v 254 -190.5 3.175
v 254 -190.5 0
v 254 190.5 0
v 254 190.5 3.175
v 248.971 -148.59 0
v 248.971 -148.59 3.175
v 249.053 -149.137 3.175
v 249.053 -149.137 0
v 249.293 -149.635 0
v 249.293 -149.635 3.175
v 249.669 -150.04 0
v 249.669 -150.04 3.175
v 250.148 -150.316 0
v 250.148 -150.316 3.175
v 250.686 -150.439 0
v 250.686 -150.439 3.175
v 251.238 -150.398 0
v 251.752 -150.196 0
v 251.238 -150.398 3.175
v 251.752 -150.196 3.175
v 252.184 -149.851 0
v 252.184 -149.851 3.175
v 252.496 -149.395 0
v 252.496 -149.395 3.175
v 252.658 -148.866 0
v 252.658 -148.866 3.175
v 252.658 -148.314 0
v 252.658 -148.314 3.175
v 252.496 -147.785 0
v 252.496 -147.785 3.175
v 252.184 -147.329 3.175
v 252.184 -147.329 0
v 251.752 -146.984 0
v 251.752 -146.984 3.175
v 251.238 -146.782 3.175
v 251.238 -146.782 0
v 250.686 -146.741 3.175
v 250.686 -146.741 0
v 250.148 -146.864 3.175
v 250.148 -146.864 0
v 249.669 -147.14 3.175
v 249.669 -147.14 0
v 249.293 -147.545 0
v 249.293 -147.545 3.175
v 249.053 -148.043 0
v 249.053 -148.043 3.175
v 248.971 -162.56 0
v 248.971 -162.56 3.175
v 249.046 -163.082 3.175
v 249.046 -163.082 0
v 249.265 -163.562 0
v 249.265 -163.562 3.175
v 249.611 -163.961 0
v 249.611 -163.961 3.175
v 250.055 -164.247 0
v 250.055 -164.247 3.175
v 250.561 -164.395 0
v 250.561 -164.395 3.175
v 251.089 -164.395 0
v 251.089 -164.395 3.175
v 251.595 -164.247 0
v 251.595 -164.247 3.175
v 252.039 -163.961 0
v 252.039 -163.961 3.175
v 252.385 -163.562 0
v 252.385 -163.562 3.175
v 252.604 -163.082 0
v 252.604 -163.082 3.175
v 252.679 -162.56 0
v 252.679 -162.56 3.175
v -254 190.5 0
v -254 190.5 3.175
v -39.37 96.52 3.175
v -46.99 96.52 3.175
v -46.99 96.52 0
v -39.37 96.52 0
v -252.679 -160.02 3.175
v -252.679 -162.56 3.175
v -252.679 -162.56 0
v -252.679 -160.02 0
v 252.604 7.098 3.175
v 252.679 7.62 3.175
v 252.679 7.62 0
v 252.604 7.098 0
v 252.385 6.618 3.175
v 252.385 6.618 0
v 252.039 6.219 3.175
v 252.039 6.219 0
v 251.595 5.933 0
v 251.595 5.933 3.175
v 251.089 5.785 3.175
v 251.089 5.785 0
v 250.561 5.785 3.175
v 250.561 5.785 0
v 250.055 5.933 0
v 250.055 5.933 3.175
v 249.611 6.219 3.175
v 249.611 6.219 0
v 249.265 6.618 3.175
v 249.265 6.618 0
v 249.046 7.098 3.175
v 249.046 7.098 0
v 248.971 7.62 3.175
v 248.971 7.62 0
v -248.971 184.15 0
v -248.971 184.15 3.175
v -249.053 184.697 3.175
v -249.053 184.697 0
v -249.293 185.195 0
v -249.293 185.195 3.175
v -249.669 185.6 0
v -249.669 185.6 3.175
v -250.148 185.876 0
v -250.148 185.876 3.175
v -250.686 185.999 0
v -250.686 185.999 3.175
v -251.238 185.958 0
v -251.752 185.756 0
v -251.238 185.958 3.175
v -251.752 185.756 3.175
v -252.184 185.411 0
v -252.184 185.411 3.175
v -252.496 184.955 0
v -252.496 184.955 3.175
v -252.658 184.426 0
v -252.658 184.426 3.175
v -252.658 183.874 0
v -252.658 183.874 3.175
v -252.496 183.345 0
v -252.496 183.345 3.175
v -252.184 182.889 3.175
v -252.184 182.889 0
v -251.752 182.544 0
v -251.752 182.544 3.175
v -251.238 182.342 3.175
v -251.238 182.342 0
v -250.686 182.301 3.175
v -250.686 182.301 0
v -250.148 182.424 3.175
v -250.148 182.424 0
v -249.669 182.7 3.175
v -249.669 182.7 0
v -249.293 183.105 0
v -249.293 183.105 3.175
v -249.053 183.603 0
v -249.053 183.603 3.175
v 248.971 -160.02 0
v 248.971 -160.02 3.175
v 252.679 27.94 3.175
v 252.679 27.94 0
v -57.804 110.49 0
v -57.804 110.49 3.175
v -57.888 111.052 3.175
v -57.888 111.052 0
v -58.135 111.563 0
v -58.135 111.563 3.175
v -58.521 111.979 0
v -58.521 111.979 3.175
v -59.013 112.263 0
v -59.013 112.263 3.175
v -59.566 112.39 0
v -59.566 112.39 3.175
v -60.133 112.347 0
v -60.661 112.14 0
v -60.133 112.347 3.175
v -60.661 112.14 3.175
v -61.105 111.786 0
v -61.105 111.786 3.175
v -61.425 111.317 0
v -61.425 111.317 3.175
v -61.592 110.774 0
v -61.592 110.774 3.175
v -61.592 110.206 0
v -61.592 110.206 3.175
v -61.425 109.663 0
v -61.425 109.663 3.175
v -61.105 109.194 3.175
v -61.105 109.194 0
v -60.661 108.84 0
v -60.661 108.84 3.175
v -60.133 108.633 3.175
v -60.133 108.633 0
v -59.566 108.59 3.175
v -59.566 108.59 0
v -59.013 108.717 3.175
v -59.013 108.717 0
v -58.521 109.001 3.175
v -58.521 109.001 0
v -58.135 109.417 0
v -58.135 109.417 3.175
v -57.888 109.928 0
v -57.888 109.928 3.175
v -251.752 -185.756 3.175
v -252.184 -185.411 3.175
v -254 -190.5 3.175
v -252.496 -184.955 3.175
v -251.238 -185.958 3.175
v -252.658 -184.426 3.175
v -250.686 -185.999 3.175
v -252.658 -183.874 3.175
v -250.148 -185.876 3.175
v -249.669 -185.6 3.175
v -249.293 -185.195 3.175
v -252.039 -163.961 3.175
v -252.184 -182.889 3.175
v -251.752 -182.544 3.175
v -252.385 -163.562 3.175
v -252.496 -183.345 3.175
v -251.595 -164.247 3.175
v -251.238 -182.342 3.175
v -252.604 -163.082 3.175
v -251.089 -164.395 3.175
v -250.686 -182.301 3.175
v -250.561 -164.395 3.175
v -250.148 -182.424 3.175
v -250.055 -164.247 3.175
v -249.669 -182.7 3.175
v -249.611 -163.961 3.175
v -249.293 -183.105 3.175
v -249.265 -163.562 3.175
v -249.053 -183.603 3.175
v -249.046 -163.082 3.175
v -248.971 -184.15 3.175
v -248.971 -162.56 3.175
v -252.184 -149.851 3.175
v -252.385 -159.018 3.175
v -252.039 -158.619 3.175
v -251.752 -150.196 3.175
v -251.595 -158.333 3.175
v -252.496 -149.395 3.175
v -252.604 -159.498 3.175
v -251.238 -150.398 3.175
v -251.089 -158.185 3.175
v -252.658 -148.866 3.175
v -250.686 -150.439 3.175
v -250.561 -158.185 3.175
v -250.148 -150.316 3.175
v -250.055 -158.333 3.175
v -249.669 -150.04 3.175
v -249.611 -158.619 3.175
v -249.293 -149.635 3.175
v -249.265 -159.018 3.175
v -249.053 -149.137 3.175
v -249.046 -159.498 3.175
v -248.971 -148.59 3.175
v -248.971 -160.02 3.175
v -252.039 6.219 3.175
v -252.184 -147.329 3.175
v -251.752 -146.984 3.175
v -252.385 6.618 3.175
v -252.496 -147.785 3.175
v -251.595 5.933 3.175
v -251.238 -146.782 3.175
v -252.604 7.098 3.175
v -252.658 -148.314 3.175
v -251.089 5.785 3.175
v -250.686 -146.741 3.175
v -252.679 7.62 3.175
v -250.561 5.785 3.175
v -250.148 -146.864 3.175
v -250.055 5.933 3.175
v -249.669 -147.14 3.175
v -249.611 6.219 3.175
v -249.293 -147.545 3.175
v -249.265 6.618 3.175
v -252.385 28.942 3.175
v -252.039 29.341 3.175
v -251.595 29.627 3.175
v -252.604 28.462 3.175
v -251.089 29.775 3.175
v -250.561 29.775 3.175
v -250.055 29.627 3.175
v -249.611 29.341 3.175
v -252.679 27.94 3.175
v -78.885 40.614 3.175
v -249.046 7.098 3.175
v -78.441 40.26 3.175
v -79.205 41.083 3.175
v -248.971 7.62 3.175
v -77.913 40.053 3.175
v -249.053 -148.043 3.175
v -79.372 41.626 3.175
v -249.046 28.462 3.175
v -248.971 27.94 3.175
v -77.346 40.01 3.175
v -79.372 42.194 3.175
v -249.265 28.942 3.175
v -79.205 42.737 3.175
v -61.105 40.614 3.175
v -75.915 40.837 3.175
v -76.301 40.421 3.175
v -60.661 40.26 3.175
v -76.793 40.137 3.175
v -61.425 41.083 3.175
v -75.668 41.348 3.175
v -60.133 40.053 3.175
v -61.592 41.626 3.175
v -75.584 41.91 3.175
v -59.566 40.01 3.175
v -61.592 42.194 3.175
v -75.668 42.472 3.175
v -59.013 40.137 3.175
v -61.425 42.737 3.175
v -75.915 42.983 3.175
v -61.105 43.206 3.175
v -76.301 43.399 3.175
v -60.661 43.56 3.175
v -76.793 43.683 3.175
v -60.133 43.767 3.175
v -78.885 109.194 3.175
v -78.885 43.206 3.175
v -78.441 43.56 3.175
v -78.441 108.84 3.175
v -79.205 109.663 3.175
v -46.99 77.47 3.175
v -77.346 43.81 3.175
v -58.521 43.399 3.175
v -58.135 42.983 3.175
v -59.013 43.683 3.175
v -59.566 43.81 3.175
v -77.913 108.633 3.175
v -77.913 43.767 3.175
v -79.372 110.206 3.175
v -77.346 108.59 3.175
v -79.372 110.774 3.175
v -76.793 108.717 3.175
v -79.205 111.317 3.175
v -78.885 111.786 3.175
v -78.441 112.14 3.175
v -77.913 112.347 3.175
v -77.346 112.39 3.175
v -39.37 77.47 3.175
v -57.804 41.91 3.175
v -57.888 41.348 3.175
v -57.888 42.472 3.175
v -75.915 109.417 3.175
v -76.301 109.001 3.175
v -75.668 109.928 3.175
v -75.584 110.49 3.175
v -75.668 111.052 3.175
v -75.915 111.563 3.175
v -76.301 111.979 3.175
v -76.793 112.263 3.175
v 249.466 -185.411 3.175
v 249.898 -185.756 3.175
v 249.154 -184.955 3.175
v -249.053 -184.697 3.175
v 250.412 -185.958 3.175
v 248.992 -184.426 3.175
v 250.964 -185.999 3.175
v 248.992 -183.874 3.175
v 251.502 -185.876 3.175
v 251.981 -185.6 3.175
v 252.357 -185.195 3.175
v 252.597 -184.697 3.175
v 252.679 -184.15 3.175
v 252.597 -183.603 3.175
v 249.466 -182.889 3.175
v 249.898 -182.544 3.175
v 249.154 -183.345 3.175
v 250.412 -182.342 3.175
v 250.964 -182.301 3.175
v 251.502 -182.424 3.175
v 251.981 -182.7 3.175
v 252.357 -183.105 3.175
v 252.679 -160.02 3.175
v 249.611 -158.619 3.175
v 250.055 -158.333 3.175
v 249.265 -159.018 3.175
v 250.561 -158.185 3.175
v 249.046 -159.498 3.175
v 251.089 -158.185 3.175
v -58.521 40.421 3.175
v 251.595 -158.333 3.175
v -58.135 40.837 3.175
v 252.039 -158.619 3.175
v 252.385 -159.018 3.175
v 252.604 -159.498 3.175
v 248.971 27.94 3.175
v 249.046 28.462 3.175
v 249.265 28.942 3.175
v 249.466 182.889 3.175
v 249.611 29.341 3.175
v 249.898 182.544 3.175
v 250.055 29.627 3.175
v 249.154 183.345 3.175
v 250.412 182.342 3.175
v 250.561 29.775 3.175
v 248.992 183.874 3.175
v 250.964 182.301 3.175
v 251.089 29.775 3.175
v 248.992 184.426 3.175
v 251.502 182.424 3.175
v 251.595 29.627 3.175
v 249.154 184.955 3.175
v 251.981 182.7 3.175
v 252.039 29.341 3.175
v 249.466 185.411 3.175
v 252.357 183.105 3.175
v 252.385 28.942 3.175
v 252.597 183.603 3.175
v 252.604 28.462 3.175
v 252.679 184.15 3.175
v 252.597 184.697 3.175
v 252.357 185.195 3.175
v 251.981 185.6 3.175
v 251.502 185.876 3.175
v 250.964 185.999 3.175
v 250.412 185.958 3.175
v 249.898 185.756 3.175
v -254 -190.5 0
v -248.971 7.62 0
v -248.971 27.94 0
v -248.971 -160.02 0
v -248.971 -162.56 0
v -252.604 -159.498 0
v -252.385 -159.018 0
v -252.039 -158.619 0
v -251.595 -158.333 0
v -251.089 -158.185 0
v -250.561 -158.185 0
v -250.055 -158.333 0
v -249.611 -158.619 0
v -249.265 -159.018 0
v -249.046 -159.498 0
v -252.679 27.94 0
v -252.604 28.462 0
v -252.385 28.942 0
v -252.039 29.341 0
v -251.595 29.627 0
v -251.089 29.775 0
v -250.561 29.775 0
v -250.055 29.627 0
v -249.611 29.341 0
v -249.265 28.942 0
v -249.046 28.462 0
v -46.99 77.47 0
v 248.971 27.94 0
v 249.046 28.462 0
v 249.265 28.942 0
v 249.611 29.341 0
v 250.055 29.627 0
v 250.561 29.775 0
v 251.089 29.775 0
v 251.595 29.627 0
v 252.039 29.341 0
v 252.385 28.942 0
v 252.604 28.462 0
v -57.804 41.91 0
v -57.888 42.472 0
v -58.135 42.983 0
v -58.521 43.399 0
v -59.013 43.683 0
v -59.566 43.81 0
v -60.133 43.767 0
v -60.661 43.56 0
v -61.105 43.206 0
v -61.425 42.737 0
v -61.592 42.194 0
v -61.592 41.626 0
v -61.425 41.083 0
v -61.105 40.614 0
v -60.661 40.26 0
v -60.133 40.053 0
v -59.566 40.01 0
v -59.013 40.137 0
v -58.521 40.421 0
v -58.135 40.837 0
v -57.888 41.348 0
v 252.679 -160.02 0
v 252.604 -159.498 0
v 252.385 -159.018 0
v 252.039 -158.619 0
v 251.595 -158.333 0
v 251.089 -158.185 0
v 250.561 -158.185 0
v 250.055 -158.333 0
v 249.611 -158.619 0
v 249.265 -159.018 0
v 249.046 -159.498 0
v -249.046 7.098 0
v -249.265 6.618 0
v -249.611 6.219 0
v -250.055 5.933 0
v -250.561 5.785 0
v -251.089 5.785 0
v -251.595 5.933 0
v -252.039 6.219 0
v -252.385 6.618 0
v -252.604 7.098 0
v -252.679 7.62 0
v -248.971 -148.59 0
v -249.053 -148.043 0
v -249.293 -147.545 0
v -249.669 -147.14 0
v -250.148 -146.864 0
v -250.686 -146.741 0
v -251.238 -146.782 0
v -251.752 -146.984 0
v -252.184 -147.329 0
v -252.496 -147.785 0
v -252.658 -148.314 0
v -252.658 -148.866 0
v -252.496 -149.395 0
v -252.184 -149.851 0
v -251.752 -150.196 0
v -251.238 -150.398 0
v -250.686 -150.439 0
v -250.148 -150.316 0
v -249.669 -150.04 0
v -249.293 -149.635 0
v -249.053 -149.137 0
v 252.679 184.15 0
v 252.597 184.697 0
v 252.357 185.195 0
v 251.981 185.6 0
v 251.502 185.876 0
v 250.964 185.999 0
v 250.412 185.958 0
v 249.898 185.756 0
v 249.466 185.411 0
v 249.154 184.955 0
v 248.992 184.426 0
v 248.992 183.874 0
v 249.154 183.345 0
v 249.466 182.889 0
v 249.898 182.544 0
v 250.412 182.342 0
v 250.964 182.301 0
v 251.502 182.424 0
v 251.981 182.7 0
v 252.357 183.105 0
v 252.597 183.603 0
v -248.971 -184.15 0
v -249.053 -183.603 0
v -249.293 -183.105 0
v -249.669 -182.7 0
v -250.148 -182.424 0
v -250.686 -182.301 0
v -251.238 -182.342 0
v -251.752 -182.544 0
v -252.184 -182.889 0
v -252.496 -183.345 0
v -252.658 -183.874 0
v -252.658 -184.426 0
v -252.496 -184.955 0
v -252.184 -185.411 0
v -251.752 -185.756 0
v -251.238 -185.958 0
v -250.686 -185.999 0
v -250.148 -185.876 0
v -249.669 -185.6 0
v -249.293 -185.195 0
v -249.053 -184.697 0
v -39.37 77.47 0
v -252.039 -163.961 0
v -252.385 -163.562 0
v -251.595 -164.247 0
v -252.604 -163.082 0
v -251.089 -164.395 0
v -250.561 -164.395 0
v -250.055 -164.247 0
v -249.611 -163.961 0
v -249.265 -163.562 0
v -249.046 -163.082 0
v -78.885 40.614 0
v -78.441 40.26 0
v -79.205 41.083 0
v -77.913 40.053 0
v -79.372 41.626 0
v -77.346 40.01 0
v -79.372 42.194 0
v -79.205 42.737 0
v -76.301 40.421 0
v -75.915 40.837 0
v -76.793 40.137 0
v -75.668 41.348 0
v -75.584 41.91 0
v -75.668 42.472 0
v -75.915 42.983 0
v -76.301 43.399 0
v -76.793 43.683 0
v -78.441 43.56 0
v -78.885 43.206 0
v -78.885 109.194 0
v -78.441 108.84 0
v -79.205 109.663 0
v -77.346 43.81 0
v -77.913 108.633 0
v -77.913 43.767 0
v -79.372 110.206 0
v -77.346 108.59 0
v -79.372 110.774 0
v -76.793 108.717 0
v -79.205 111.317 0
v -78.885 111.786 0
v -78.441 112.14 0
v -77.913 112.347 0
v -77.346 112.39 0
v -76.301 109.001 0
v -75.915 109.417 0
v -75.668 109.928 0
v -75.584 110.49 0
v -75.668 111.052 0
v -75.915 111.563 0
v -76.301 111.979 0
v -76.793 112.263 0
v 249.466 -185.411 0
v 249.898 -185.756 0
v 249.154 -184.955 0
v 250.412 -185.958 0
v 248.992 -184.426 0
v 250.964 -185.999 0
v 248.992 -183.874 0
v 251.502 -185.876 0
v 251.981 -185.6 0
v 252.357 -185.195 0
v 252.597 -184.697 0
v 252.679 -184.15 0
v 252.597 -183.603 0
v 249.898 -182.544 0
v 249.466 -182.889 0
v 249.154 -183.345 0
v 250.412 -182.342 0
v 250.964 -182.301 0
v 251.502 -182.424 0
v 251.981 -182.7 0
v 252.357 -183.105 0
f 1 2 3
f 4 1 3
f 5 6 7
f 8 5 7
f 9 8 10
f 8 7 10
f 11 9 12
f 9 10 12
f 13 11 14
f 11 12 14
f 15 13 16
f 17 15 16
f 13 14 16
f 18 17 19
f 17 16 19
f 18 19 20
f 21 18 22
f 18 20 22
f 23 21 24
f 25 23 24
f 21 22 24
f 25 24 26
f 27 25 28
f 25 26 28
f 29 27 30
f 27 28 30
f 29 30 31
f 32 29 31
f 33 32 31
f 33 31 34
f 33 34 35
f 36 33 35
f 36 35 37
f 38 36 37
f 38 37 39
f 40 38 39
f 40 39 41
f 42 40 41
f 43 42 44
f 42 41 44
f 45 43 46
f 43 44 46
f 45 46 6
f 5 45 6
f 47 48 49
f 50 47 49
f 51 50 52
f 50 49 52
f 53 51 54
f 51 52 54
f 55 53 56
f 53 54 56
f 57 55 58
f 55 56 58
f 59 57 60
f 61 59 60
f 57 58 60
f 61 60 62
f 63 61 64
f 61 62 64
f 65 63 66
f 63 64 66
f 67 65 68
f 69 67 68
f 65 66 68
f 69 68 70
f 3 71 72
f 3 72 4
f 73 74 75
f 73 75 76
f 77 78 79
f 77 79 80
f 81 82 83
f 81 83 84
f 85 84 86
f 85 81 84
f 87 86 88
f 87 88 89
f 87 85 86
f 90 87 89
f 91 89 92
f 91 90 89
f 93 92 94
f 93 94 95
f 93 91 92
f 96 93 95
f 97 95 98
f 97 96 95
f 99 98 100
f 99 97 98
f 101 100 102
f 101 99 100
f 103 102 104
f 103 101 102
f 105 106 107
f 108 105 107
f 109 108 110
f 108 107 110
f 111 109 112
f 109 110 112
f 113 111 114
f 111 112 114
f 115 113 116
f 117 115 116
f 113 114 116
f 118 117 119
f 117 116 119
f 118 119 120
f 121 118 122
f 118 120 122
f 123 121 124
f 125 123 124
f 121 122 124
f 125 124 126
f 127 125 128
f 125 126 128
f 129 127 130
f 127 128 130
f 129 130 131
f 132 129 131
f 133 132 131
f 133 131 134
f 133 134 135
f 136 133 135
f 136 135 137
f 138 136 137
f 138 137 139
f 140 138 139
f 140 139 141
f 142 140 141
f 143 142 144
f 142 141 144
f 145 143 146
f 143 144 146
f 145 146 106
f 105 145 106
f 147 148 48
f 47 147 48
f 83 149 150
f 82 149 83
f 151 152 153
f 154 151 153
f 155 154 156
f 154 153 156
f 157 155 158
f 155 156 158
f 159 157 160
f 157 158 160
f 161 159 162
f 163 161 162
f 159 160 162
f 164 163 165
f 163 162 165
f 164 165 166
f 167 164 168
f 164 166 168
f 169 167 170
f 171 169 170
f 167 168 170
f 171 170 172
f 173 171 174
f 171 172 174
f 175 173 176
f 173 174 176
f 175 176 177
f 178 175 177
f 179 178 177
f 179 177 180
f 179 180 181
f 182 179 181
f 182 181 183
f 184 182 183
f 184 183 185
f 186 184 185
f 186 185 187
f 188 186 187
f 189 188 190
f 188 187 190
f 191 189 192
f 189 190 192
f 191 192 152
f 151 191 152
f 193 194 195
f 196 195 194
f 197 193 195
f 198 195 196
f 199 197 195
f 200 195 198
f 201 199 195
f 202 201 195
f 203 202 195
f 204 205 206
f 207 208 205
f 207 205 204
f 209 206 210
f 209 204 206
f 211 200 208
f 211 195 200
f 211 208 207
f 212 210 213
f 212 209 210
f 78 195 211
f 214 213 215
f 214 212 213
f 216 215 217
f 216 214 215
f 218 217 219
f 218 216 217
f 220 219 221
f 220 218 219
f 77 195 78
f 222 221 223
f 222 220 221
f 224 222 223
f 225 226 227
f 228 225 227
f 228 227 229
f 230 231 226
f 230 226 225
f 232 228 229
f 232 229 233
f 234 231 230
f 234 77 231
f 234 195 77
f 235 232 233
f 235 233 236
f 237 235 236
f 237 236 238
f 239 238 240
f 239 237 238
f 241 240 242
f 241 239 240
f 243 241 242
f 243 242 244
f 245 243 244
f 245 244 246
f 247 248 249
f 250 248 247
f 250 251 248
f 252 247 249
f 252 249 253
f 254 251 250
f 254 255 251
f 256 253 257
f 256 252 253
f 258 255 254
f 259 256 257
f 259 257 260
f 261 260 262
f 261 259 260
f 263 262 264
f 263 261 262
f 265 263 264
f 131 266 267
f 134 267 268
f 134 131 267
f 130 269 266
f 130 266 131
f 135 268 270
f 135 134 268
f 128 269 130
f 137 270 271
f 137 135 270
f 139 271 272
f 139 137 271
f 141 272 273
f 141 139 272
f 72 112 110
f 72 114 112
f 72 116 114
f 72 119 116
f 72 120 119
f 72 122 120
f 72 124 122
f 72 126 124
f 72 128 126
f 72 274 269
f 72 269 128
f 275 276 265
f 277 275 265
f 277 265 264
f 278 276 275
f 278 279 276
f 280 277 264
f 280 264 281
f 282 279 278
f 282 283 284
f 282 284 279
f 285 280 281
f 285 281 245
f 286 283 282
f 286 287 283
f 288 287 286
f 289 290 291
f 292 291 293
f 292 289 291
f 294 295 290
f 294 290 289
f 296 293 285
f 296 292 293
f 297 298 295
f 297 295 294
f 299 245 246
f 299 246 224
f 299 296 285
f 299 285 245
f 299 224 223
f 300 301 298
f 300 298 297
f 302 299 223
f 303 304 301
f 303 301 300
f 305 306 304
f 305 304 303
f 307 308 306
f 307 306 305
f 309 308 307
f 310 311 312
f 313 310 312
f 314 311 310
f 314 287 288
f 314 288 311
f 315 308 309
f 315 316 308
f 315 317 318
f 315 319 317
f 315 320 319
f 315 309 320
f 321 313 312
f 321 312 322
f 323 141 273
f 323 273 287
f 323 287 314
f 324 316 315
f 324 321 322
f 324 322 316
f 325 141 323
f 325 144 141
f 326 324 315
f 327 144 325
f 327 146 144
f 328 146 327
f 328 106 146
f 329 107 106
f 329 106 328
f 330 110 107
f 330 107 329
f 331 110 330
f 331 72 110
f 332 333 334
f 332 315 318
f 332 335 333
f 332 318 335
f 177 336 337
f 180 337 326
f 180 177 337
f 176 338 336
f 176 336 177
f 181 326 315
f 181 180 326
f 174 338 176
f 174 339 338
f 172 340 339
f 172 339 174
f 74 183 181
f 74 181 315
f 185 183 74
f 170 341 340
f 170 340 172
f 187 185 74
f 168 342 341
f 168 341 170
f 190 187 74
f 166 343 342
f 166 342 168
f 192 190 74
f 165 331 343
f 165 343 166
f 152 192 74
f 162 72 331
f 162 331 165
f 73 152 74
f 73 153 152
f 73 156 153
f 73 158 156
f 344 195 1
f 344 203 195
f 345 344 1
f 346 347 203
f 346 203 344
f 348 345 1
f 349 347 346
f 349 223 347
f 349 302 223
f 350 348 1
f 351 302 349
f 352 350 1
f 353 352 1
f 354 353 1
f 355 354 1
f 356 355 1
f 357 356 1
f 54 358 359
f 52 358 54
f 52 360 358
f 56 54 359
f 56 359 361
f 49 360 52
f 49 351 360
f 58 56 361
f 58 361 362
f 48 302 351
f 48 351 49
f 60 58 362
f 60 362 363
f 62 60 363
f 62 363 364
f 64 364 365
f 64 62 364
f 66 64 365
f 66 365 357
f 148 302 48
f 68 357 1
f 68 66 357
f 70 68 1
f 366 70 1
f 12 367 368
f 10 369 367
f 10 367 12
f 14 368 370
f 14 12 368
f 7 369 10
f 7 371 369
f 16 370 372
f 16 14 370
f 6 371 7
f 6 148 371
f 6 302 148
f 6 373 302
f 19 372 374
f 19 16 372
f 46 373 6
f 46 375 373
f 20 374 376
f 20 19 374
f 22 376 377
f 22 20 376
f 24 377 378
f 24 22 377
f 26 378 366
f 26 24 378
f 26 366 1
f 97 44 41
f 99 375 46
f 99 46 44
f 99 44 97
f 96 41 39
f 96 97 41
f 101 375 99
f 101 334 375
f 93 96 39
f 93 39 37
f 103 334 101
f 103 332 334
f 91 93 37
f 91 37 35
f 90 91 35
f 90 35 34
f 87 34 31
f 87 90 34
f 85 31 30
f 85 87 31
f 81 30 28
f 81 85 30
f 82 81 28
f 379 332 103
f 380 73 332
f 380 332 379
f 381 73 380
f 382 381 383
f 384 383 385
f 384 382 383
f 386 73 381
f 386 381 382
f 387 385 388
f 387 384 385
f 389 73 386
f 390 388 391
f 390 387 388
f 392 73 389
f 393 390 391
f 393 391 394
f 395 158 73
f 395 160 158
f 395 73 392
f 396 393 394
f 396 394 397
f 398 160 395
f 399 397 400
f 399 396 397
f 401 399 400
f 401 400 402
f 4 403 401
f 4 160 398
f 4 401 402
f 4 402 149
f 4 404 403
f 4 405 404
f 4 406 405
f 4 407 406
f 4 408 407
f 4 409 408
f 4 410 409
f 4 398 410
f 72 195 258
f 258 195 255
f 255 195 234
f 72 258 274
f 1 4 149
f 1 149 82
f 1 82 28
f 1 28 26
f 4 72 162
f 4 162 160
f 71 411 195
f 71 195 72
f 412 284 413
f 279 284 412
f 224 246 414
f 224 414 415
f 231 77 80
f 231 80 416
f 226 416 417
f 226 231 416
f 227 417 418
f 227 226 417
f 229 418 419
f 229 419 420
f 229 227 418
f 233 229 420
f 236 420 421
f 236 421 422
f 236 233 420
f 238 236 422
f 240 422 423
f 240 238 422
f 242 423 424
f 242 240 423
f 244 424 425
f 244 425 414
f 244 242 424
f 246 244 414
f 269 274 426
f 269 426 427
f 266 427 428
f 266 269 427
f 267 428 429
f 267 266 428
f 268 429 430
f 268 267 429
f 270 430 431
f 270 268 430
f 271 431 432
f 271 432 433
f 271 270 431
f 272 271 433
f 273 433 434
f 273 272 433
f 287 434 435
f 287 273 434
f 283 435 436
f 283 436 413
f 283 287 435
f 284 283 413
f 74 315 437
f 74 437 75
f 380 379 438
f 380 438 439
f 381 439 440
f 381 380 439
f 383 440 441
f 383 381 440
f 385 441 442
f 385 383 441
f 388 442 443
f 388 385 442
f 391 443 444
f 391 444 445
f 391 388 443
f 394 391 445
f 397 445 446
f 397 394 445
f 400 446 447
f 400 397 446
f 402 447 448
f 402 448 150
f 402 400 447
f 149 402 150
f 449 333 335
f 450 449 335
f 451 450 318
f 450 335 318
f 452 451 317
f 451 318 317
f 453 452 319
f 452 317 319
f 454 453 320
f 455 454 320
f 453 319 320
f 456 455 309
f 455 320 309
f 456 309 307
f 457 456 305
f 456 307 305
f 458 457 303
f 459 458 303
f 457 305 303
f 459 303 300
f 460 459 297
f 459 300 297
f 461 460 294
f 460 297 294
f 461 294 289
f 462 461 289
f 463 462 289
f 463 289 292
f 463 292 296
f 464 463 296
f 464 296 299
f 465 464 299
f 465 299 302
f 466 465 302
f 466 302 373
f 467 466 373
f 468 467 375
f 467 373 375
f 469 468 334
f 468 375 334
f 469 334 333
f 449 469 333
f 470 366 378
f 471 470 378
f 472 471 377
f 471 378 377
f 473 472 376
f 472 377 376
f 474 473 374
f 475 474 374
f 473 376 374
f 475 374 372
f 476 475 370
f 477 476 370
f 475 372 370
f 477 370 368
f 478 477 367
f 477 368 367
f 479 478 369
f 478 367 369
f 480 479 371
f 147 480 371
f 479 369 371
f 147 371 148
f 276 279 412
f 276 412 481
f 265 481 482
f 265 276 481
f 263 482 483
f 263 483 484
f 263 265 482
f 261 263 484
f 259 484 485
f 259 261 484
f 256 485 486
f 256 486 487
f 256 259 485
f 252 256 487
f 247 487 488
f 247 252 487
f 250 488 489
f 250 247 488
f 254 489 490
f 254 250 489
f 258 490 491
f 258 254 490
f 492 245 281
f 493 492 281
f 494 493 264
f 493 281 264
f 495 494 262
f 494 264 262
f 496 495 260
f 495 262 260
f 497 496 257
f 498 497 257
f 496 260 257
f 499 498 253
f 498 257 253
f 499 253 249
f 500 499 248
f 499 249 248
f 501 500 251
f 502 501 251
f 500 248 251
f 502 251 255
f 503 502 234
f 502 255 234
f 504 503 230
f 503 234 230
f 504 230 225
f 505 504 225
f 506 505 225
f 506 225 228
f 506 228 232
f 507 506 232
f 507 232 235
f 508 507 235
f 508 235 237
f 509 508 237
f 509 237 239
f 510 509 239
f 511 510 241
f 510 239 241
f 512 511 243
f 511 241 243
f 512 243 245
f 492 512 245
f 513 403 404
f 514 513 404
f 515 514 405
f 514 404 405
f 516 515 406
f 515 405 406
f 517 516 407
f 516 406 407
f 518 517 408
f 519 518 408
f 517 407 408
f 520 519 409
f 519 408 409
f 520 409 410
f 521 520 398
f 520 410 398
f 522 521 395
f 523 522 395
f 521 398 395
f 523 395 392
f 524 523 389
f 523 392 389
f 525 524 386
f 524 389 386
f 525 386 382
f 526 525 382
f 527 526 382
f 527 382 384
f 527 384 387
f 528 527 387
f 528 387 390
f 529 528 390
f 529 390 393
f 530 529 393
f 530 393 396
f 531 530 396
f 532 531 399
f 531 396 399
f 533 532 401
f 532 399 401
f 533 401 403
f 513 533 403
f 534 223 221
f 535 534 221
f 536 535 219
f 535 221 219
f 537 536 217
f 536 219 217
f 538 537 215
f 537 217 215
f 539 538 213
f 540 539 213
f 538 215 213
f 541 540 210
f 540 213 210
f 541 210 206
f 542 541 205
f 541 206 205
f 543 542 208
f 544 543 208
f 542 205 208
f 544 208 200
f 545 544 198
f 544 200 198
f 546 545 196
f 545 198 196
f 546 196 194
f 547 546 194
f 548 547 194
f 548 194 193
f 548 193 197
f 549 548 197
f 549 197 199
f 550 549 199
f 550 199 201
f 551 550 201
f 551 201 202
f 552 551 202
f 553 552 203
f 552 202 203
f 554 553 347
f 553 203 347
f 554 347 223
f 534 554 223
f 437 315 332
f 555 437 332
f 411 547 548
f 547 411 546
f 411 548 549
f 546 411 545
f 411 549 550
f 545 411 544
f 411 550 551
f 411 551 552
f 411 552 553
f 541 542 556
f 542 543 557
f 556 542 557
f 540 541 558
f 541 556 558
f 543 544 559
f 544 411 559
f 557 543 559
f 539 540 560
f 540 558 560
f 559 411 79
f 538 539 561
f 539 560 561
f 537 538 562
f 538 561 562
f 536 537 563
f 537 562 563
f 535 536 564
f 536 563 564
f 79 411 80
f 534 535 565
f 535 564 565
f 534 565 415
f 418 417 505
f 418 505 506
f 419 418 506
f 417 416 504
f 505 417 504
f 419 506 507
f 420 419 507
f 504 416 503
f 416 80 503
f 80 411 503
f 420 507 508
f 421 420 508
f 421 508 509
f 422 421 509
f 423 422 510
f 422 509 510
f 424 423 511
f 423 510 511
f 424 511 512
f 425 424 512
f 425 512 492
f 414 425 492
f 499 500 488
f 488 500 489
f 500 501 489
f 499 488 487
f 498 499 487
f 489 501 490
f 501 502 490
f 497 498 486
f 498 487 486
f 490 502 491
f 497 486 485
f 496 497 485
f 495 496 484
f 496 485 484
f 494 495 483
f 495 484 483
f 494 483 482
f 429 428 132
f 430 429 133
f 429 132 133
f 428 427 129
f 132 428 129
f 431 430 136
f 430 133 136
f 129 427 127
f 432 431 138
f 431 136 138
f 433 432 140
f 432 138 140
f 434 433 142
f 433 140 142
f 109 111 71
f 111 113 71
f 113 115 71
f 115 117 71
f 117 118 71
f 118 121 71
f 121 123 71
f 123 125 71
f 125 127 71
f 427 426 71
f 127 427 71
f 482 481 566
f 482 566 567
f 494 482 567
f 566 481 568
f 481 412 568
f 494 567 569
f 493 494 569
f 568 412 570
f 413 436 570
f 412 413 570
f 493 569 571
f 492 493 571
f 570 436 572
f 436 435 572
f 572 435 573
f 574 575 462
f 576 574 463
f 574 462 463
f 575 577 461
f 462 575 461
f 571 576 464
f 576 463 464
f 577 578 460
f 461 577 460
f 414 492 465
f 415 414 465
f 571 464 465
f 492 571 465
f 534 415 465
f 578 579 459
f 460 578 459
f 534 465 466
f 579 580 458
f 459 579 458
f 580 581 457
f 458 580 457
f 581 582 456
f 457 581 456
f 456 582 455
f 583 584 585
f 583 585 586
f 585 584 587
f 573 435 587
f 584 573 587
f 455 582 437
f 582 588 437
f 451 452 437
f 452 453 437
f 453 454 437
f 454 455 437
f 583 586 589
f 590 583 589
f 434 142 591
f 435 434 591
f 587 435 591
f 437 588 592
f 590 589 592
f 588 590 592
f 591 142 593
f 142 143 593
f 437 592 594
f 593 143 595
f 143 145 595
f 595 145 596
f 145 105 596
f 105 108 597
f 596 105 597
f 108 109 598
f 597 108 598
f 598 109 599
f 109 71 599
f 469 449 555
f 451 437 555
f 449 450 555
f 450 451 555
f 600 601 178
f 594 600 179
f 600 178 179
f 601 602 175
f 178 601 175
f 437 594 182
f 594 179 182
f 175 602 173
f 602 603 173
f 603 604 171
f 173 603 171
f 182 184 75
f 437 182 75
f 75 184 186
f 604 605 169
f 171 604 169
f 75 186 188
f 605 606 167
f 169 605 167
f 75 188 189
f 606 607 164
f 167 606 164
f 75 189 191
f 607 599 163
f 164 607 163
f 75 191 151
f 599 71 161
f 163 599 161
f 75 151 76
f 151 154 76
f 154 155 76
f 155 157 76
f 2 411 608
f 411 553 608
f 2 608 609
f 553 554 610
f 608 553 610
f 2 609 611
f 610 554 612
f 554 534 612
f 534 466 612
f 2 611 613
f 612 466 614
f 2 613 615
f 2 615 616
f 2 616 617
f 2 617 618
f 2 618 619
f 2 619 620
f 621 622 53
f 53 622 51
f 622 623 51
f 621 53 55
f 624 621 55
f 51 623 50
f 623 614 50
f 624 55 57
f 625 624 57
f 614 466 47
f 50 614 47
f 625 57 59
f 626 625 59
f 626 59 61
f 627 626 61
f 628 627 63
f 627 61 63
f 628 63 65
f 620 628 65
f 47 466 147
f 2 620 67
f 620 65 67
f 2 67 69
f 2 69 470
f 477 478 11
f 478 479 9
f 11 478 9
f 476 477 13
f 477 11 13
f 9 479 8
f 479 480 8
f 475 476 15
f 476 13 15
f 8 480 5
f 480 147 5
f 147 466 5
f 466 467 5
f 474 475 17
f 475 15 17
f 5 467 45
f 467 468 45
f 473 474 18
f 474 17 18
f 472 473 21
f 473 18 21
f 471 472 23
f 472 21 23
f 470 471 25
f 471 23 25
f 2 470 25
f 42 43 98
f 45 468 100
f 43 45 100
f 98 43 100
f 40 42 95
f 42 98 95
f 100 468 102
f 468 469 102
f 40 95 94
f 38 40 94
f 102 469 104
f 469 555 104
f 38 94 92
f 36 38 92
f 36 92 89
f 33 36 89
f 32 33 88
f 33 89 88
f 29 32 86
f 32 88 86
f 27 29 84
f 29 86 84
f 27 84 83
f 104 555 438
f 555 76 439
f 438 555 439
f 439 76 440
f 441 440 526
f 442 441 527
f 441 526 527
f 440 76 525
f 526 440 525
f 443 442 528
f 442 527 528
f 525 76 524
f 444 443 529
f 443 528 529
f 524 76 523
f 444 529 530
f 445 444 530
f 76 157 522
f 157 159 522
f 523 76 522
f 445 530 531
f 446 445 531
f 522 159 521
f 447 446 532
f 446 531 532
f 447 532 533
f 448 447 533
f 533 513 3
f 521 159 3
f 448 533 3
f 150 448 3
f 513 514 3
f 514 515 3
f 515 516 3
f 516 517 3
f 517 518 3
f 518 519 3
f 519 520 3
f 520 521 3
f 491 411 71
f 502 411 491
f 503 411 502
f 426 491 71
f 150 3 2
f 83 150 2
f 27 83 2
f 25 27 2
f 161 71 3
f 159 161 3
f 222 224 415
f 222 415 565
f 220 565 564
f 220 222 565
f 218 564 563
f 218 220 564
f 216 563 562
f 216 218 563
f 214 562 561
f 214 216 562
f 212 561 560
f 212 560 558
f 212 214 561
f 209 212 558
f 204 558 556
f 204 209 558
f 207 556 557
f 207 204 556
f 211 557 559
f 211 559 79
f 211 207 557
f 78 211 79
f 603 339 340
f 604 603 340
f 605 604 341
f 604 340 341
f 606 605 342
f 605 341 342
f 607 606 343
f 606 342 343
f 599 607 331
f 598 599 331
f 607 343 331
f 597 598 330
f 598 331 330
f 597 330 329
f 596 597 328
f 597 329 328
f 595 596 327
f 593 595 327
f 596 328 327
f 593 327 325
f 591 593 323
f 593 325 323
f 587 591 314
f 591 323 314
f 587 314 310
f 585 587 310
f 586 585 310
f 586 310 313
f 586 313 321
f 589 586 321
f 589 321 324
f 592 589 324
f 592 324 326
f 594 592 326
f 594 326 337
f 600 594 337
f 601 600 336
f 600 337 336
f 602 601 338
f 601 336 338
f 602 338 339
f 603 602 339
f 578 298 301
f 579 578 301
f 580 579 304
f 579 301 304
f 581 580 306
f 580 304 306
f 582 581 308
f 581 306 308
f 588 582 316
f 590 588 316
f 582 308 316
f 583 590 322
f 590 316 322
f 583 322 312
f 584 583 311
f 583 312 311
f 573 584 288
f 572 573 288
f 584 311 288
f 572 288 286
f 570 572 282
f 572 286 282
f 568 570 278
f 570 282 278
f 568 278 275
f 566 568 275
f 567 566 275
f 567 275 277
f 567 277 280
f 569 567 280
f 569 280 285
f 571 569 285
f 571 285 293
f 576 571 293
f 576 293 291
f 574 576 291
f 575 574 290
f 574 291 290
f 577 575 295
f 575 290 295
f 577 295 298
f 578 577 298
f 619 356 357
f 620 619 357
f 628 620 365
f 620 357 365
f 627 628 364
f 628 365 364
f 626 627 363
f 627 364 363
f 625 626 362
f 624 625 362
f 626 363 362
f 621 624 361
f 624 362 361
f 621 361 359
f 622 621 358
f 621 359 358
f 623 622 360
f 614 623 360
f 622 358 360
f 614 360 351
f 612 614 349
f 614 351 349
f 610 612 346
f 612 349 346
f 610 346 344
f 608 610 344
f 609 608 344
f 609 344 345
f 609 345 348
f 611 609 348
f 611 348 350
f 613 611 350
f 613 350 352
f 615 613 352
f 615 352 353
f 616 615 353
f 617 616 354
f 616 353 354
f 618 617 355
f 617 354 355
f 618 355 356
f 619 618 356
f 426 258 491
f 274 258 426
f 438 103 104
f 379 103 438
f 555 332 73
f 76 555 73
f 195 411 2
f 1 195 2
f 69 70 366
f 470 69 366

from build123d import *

# Parameters (mm, degrees)
SKETCH1_W           = 508
SKETCH1_H           = 381
BOSS_EXTRUDE1_DEPTH = 3.175
SKETCH3_W           = 7.62
SKETCH3_H           = 19.05
CUT_EXTRUDE2_DEPTH  = 3.175
SKETCH2_R           = 1.8542
SKETCH2_R_2         = 1.905
CUT_EXTRUDE1_DEPTH  = 3.175


with BuildPart() as part:
    # Sketch1 → Boss-Extrude1 (new body)
    with BuildSketch(Plane.XY):
        Rectangle(SKETCH1_W, SKETCH1_H)
    extrude(amount=BOSS_EXTRUDE1_DEPTH)

    # Sketch3 → Cut-Extrude2 (cut)
    with BuildSketch(Plane.XY.offset(3.175)):
        with Locations((-43.18, 86.995)):
            Rectangle(SKETCH3_W, SKETCH3_H)
    extrude(amount=-CUT_EXTRUDE2_DEPTH, mode=Mode.SUBTRACT)

    # Sketch2 → Cut-Extrude1 (cut)
    with BuildSketch(Plane.XY.offset(3.175)):
        with Locations((-250.825, -184.15)):
            Circle(SKETCH2_R)
        with Locations((-250.825, 184.15)):
            Circle(SKETCH2_R)
        with Locations((250.825, 184.15)):
            Circle(SKETCH2_R)
        with Locations((250.825, -184.15)):
            Circle(SKETCH2_R)
        with Locations((-250.825, -148.59)):
            Circle(SKETCH2_R)
        with Locations(Location((250.825, -148.59, 0), (0, 0, 180))):
            Circle(SKETCH2_R)
        with Locations((-77.488669, 110.49)):
            Circle(SKETCH2_R_2)
        with Locations((-77.488669, 41.91)):
            Circle(SKETCH2_R_2)
        with Locations((-59.708669, 110.49)):
            Circle(SKETCH2_R_2)
        with Locations((-59.708669, 41.91)):
            Circle(SKETCH2_R_2)
        with BuildLine():
            Line((-252.6792, 20.32), (-252.6792, 27.94))
            ThreePointArc((-252.6792, 27.94), (-250.825, 29.7942), (-248.9708, 27.94))
            Line((-248.9708, 27.94), (-248.9708, 20.32))
            Line((-248.9708, 20.32), (-248.9708, 15.24))
            Line((-248.9708, 15.24), (-248.9708, 7.62))
            ThreePointArc((-248.9708, 7.62), (-250.825, 5.7658), (-252.6792, 7.62))
            Line((-252.6792, 7.62), (-252.6792, 15.24))
            Line((-252.6792, 15.24), (-252.6792, 20.32))
        make_face()
        with BuildLine():
            Line((248.9708, 20.32), (248.9708, 27.94))
            ThreePointArc((248.9708, 27.94), (250.825, 29.7942), (252.6792, 27.94))
            Line((252.6792, 27.94), (252.6792, 20.32))
            Line((252.6792, 20.32), (252.6792, 15.24))
            Line((252.6792, 15.24), (252.6792, 7.62))
            ThreePointArc((252.6792, 7.62), (250.825, 5.7658), (248.9708, 7.62))
            Line((248.9708, 7.62), (248.9708, 15.24))
            Line((248.9708, 15.24), (248.9708, 20.32))
        make_face()
        with BuildLine():
            Line((-252.6792, -162.56), (-252.6792, -160.02))
            ThreePointArc((-252.6792, -160.02), (-250.825, -158.1658), (-248.9708, -160.02))
            Line((-248.9708, -160.02), (-248.9708, -162.56))
            ThreePointArc((-248.9708, -162.56), (-250.825, -164.4142), (-252.6792, -162.56))
        make_face()
        with BuildLine():
            Line((252.6792, -162.56), (252.6792, -160.02))
            ThreePointArc((252.6792, -160.02), (250.825, -158.1658), (248.9708, -160.02))
            Line((248.9708, -160.02), (248.9708, -162.56))
            ThreePointArc((248.9708, -162.56), (250.825, -164.4142), (252.6792, -162.56))
        make_face()
    extrude(amount=-CUT_EXTRUDE1_DEPTH, mode=Mode.SUBTRACT)


solid = part.part
